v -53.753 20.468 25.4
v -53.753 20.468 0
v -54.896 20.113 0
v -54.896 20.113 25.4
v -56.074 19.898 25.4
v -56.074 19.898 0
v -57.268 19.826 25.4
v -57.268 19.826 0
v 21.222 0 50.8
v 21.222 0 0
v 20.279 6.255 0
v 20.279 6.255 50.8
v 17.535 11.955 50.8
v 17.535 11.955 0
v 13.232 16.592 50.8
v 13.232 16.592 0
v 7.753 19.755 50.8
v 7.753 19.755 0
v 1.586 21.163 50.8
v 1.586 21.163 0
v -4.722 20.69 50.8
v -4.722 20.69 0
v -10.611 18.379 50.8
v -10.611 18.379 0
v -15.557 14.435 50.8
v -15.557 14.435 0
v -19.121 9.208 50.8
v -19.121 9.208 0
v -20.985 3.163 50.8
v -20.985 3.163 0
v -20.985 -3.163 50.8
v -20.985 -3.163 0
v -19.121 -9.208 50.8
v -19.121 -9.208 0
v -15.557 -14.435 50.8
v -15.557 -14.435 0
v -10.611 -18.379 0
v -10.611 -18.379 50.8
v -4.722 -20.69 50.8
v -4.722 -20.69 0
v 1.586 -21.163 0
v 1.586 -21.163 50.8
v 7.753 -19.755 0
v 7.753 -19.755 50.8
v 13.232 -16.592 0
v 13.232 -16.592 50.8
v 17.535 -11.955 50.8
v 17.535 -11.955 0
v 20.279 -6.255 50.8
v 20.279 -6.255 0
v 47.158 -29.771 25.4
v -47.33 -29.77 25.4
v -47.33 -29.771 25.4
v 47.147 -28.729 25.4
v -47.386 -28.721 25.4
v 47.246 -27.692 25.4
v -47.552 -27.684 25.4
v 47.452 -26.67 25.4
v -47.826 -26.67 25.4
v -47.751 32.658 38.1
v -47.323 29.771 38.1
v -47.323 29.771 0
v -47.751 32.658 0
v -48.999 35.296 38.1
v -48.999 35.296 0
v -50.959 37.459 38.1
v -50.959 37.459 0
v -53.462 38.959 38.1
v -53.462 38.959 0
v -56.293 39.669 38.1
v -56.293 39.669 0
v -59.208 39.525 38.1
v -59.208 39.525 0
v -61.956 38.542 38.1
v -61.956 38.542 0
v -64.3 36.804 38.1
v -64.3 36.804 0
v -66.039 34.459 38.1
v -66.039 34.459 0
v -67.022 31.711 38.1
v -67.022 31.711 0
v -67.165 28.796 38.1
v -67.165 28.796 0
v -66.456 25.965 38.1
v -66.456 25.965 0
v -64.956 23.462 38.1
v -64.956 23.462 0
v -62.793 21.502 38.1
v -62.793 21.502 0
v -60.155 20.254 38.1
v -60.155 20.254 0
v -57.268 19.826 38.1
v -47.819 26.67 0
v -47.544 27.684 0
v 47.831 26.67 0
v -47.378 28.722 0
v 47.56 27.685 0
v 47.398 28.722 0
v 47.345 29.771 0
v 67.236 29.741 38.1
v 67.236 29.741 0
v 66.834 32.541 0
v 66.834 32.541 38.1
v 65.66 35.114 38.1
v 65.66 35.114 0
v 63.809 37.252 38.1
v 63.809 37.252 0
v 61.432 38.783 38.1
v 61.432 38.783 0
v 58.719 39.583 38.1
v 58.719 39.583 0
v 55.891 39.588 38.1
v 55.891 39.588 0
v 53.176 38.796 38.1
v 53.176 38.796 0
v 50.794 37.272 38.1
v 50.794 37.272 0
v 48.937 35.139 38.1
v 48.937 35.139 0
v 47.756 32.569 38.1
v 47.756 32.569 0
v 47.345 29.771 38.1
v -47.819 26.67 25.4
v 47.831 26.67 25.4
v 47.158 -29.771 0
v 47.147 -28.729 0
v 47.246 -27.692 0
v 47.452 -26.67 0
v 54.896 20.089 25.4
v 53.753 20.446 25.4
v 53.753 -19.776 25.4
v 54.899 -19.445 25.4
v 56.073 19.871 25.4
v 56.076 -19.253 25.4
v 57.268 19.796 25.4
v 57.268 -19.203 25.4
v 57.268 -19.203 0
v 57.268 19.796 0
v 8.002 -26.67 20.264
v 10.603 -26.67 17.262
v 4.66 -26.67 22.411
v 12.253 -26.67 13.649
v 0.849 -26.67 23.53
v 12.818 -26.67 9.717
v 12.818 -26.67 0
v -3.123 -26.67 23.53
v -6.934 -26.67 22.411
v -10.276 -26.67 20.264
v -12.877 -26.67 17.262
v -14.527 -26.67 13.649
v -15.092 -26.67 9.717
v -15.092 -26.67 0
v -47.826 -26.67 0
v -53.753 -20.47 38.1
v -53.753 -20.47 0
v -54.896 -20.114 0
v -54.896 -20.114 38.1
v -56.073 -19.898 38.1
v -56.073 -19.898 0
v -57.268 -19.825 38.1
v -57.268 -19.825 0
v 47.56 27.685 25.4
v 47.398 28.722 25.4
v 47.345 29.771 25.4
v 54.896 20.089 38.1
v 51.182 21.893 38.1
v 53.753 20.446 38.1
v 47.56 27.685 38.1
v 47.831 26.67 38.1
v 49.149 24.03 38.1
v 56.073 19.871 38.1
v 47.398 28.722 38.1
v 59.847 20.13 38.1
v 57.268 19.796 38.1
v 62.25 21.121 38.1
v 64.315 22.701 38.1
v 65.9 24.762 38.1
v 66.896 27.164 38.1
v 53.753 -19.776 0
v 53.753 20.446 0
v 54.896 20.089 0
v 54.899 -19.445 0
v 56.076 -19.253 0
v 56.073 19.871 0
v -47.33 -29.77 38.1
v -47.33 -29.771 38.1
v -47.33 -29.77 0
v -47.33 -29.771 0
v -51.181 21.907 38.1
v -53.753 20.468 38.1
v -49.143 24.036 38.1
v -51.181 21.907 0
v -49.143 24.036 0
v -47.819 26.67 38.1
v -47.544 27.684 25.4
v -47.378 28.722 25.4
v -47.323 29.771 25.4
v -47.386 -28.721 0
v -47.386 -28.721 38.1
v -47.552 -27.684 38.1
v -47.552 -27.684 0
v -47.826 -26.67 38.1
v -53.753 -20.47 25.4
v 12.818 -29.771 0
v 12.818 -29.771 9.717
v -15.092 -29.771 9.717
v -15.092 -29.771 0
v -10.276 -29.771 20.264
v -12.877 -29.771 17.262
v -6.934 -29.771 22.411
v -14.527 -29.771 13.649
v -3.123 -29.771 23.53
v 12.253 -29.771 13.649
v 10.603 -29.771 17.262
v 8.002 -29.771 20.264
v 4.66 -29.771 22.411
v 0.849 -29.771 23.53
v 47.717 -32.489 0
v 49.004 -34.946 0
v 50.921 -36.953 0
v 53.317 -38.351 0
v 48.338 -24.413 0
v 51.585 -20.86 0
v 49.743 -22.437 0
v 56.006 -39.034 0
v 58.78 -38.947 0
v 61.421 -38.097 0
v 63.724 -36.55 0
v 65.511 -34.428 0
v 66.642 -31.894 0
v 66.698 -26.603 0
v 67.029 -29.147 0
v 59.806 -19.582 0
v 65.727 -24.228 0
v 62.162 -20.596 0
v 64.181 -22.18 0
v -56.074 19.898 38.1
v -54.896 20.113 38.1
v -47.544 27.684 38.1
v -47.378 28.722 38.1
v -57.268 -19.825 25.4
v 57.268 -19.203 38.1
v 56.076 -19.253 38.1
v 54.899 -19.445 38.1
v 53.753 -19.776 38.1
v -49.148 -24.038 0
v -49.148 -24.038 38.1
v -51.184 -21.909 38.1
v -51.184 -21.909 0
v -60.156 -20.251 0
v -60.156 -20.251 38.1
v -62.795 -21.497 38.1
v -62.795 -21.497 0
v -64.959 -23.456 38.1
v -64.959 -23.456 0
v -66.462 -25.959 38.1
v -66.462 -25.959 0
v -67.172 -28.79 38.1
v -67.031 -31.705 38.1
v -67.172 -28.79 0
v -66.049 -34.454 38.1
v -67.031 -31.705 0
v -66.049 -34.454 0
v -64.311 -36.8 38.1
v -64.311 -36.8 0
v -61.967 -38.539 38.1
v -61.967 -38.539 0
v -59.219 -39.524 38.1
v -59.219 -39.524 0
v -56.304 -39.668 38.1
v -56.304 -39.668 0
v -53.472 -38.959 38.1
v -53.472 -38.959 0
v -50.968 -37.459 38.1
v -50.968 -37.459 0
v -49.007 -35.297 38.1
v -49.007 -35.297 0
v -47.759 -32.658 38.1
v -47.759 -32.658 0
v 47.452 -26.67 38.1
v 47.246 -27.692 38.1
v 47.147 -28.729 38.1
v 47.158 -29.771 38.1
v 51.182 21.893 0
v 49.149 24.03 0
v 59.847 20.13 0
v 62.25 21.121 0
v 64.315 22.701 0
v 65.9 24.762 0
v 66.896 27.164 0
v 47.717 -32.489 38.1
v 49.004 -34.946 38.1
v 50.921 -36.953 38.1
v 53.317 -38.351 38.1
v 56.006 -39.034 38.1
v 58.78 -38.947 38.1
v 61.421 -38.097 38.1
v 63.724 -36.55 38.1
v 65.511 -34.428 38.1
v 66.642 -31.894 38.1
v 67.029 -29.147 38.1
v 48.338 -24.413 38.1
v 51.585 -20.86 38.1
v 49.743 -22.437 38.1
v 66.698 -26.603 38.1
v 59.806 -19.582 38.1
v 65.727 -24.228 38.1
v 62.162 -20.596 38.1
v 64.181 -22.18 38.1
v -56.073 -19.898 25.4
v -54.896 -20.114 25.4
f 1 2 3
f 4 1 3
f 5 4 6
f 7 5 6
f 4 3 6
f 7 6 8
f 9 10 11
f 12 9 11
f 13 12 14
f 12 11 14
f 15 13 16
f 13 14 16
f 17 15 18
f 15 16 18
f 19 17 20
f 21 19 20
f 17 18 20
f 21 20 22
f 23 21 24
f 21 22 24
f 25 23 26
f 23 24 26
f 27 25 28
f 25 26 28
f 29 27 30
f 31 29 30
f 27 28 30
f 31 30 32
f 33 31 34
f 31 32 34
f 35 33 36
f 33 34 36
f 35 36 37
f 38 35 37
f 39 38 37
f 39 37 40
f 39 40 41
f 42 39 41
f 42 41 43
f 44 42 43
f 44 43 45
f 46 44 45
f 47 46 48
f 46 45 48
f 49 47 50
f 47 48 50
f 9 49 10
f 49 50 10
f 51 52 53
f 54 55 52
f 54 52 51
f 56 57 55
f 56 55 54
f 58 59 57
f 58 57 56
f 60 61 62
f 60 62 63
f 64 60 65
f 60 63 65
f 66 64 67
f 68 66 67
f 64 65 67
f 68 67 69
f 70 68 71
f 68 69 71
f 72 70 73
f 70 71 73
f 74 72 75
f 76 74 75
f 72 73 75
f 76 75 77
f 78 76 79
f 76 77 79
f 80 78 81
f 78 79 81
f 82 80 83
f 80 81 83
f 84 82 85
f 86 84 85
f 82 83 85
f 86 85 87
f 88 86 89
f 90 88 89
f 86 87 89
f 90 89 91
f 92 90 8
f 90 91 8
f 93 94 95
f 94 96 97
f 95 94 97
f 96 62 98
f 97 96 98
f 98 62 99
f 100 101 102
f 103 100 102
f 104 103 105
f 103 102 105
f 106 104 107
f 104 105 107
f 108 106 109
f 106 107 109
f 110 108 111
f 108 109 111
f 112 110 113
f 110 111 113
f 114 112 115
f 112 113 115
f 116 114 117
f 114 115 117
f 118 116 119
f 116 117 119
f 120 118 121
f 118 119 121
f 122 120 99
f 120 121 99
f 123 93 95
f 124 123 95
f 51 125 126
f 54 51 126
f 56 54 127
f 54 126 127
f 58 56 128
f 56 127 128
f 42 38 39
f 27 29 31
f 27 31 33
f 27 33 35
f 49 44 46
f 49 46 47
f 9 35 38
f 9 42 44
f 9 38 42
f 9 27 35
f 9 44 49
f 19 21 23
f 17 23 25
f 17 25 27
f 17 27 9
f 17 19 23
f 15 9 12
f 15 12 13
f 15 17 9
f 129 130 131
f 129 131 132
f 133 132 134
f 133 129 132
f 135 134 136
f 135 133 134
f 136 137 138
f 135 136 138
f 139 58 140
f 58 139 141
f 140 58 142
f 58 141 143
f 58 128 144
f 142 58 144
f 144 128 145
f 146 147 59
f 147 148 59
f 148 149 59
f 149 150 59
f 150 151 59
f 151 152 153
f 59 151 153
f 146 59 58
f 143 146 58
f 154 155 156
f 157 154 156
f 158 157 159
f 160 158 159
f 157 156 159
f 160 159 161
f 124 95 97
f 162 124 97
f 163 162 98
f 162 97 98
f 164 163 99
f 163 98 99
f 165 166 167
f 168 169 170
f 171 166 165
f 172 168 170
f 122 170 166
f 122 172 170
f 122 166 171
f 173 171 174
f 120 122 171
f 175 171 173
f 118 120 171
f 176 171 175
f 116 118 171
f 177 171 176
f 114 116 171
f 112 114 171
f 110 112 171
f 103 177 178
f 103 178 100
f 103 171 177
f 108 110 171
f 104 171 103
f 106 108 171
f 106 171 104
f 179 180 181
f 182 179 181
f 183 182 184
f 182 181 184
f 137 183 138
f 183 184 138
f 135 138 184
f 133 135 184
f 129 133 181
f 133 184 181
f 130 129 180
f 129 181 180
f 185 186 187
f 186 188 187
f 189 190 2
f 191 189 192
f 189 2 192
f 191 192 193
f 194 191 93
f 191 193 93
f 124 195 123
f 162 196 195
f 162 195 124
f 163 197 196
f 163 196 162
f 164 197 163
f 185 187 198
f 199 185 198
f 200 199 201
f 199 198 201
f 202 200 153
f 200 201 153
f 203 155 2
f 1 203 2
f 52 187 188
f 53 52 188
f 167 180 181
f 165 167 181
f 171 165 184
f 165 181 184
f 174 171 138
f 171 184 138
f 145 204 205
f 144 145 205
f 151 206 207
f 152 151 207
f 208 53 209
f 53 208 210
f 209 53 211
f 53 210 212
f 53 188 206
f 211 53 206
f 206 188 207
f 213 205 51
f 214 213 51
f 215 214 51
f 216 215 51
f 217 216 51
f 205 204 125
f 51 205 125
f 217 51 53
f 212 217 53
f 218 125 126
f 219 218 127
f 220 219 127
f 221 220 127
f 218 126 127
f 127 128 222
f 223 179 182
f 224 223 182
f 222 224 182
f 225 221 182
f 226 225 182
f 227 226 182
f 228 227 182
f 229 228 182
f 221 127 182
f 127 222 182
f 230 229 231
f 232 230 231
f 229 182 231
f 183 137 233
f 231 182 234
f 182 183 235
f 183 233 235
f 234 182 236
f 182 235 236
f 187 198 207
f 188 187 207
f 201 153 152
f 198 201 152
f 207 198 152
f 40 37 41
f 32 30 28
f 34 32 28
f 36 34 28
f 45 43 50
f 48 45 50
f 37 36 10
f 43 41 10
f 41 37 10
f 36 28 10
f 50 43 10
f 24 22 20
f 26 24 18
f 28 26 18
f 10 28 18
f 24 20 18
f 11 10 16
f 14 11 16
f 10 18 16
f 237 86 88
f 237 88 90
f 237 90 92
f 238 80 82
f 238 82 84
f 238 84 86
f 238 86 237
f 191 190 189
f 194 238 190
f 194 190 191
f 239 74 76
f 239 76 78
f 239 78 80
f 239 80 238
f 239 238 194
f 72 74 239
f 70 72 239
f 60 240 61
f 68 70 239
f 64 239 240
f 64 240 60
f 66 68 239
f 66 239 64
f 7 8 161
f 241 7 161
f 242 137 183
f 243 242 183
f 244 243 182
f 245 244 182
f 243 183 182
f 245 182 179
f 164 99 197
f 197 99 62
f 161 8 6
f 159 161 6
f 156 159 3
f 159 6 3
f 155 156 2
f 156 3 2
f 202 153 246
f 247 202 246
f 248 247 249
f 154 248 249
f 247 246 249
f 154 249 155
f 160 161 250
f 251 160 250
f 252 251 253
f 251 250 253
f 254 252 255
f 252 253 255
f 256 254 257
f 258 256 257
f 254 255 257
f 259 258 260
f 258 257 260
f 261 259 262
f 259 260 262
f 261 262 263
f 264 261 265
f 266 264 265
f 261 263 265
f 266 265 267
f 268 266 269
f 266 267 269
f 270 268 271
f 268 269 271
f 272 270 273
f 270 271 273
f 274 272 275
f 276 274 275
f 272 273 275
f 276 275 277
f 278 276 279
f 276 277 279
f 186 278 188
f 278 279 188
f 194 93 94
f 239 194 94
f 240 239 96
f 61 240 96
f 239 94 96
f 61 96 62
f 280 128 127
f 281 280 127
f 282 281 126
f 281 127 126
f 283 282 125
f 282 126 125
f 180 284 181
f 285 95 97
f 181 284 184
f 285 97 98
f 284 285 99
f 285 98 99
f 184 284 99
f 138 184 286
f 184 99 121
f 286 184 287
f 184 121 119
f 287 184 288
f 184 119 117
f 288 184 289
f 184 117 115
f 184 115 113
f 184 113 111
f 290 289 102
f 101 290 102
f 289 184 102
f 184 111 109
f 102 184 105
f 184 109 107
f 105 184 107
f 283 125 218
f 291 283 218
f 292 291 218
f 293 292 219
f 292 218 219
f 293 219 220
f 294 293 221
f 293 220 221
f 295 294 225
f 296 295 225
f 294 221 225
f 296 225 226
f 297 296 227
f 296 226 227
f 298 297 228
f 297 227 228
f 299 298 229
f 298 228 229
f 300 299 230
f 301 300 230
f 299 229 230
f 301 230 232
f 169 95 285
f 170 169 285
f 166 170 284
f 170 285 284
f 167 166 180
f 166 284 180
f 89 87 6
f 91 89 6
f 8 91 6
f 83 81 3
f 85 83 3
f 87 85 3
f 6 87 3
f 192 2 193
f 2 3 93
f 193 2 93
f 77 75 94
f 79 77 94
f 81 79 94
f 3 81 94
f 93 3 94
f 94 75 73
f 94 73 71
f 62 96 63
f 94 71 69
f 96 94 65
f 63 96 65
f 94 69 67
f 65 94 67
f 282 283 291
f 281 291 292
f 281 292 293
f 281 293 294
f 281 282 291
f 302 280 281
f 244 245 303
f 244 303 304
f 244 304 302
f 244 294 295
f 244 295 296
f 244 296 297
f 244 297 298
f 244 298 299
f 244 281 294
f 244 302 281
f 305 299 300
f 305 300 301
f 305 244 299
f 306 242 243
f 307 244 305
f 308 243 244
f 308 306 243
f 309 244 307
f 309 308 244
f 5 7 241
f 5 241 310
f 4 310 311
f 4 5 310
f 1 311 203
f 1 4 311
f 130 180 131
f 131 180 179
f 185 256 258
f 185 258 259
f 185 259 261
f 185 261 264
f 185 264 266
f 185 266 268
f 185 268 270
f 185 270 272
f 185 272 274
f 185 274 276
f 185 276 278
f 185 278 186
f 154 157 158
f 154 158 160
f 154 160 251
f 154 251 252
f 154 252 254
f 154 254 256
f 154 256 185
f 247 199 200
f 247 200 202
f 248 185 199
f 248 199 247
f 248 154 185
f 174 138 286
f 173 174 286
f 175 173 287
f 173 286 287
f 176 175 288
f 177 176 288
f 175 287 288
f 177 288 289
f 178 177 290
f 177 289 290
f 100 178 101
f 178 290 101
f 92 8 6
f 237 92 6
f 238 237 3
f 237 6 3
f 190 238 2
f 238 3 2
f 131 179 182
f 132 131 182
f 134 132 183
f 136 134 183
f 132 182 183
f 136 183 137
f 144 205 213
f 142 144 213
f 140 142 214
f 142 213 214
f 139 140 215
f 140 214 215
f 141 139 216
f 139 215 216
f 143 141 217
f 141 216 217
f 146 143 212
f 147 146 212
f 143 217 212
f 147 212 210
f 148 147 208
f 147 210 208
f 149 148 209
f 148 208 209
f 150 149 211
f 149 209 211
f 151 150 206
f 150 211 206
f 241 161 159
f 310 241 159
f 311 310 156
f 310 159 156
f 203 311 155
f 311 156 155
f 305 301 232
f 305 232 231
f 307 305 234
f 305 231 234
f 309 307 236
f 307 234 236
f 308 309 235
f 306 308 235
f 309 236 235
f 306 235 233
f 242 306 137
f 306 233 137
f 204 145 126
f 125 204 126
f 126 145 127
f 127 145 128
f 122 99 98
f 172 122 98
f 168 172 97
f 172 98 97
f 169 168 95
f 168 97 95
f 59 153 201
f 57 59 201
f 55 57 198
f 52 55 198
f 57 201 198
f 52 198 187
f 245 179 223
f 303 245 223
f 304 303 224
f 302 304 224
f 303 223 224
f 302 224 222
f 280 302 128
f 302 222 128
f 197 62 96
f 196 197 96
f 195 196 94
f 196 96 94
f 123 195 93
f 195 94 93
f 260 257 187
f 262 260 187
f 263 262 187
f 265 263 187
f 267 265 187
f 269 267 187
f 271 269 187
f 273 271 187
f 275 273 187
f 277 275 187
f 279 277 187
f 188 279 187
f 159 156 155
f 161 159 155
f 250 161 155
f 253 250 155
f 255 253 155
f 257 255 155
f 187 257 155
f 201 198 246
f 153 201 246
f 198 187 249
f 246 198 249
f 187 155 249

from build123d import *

# Parameters (mm, degrees)
F1_DEPTH = 25.4
F2_DEPTH = 38.1
F0_R     = 21.2222684157
F3_DEPTH = 50.8
F5_DEPTH = 25.4


# Not quite as in the source:
# - a feature of the source that left no trace in its solid (it failed there, or was rolled back) is left out


with BuildPart() as f1:
    # F0 (on Top) → F1 (new body)
    with BuildSketch(Plane.XY):
        with BuildLine():
            Line((57.2681427002, -19.2034440821), (57.2681427002, 19.7960699943))
            ThreePointArc((57.2681427002, 19.7960699943), (55.4813658991, 19.9619755545), (53.7534877658, 20.4462617803))
            Line((53.7534877658, 20.4462617803), (53.7534877658, -19.7758921918))
            ThreePointArc((53.7534877658, -19.7758921918), (55.4849853919, -19.3310808749), (57.2681427002, -19.2034440821))
        make_face()
    extrude(amount=F1_DEPTH)


with BuildPart() as f1b:
    # F0 (on Top) → F1, piece 2 (new body)
    with BuildSketch(Plane.XY):
        with BuildLine():
            ThreePointArc((-47.3303807535, -29.7702029347), (-47.330380765, -29.7706825659), (-47.3303807997, -29.771162197))
            Line((-47.3303807997, -29.771162197), (47.1581171171, -29.771162197))
            ThreePointArc((47.1581171171, -29.771162197), (47.1828392876, -28.209007874), (47.4519053251, -26.6700014472))
            Line((47.4519053251, -26.6700014472), (-47.8259358741, -26.6700014472))
            ThreePointArc((-47.8259358741, -26.6700014472), (-47.4550509459, -28.2004239582), (-47.3303807535, -29.7702029347))
        make_face()
    extrude(amount=F1_DEPTH)

    # F4 (on face) → F5 (cut)
    with BuildSketch(Plane.XZ.offset(29.771162197)):
        with BuildLine():
            Line((-15.0923253968, 0), (0, 0))
            Line((0, 0), (12.8181409091, 0))
            Line((12.8181409091, 0), (12.8181409091, 9.716976434))
            ThreePointArc((12.8181409091, 9.716976434), (-1.1370922439, 23.6722095869), (-15.0923253968, 9.716976434))
            Line((-15.0923253968, 9.716976434), (-15.0923253968, 0))
        make_face()
    extrude(amount=-F5_DEPTH, mode=Mode.SUBTRACT)


with BuildPart() as f1c:
    # F0 (on Top) → F1, piece 3 (new body)
    with BuildSketch(Plane.XY):
        with BuildLine():
            ThreePointArc((-53.7534877658, 20.4676737388), (-55.4817610377, 19.9876793123), (-57.2681427002, 19.8259273179))
            Line((-57.2681427002, 19.8259273179), (-57.2681427002, -19.8249708633))
            ThreePointArc((-57.2681427002, -19.8249708633), (-55.4816289767, -19.9881117126), (-53.7534877658, -20.469541018))
            Line((-53.7534877658, -20.469541018), (-53.7534877658, 20.4676737388))
        make_face()
    extrude(amount=F1_DEPTH)


with BuildPart() as f1d:
    # F0 (on Top) → F1, piece 4 (new body)
    with BuildSketch(Plane.XY):
        with BuildLine():
            ThreePointArc((47.8313635292, 26.6700014472), (47.4652042143, 28.2012835622), (47.345293281, 29.771162197))
            Line((47.345293281, 29.771162197), (-47.3229078211, 29.771162197))
            ThreePointArc((-47.3229078211, 29.771162197), (-47.4476577038, 28.2008847583), (-47.8187777055, 26.6700014472))
            Line((-47.8187777055, 26.6700014472), (47.8313635292, 26.6700014472))
        make_face()
    extrude(amount=F1_DEPTH)


with BuildPart() as f2:
    # F0 (on Top) → F2 (new body)
    with BuildSketch(Plane.XY):
        with BuildLine():
            ThreePointArc((67.2357181452, 29.7412797809), (57.305424491, 39.6865034364), (47.345293281, 29.771162197))
            ThreePointArc((47.345293281, 29.771162197), (47.4652042143, 28.2012835622), (47.8313635292, 26.6700014472))
            ThreePointArc((47.8313635292, 26.6700014472), (50.0857288168, 22.8856827883), (53.7534877658, 20.4462617803))
            ThreePointArc((53.7534877658, 20.4462617803), (55.4813658991, 19.9619755545), (57.2681427002, 19.7960699943))
            ThreePointArc((57.2681427002, 19.7960699943), (64.314923266, 22.7010426053), (67.2357181452, 29.7412797809))
        make_face()
    extrude(amount=F2_DEPTH)


with BuildPart() as f2b:
    # F0 (on Top) → F2, piece 2 (new body)
    with BuildSketch(Plane.XY):
        with BuildLine():
            ThreePointArc((67.0289794348, -29.1469693184), (64.1809827389, -22.1801259176), (57.2681427002, -19.2034440821))
            ThreePointArc((57.2681427002, -19.2034440821), (55.4849853919, -19.3310808749), (53.7534877658, -19.7758921918))
            ThreePointArc((53.7534877658, -19.7758921918), (49.7430246375, -22.4371609842), (47.4519053251, -26.6700014472))
            ThreePointArc((47.4519053251, -26.6700014472), (47.1828392876, -28.209007874), (47.1581171171, -29.771162197))
            ThreePointArc((47.1581171171, -29.771162197), (57.3959949366, -39.0873011287), (67.0289794348, -29.1469693184))
        make_face()
    extrude(amount=F2_DEPTH)


with BuildPart() as f2c:
    # F0 (on Top) → F2, piece 3 (new body)
    with BuildSketch(Plane.XY):
        with BuildLine():
            ThreePointArc((-53.7534877658, -20.469541018), (-55.4816289767, -19.9881117126), (-57.2681427002, -19.8249708633))
            ThreePointArc((-57.2681427002, -19.8249708633), (-64.3109392552, -36.7995640952), (-47.3303807997, -29.771162197))
            ThreePointArc((-47.3303807997, -29.771162197), (-47.330380765, -29.7706825659), (-47.3303807535, -29.7702029347))
            ThreePointArc((-47.3303807535, -29.7702029347), (-47.4550509459, -28.2004239582), (-47.8259358741, -26.6700014472))
            ThreePointArc((-47.8259358741, -26.6700014472), (-50.0868483078, -22.8978437219), (-53.7534877658, -20.469541018))
        make_face()
    extrude(amount=F2_DEPTH)


with BuildPart() as f2d:
    # F0 (on Top) → F2, piece 4 (new body)
    with BuildSketch(Plane.XY):
        with BuildLine():
            ThreePointArc((-47.8187777055, 26.6700014472), (-47.4476577038, 28.2008847583), (-47.3229078211, 29.771162197))
            ThreePointArc((-47.3229078211, 29.771162197), (-64.3004857237, 36.8035052205), (-57.2681427002, 19.8259273179))
            ThreePointArc((-57.2681427002, 19.8259273179), (-55.4817610377, 19.9876793123), (-53.7534877658, 20.4676737388))
            ThreePointArc((-53.7534877658, 20.4676737388), (-50.0824854281, 22.8955512155), (-47.8187777055, 26.6700014472))
        make_face()
    extrude(amount=F2_DEPTH)


with BuildPart() as f3:
    # F0 (on Top) → F3 (new body)
    with BuildSketch(Plane.XY):
        Circle(F0_R)
    extrude(amount=F3_DEPTH)


solid = Compound([f1.part, f1b.part, f1c.part, f1d.part, f2.part, f2b.part, f2c.part, f2d.part, f3.part])
